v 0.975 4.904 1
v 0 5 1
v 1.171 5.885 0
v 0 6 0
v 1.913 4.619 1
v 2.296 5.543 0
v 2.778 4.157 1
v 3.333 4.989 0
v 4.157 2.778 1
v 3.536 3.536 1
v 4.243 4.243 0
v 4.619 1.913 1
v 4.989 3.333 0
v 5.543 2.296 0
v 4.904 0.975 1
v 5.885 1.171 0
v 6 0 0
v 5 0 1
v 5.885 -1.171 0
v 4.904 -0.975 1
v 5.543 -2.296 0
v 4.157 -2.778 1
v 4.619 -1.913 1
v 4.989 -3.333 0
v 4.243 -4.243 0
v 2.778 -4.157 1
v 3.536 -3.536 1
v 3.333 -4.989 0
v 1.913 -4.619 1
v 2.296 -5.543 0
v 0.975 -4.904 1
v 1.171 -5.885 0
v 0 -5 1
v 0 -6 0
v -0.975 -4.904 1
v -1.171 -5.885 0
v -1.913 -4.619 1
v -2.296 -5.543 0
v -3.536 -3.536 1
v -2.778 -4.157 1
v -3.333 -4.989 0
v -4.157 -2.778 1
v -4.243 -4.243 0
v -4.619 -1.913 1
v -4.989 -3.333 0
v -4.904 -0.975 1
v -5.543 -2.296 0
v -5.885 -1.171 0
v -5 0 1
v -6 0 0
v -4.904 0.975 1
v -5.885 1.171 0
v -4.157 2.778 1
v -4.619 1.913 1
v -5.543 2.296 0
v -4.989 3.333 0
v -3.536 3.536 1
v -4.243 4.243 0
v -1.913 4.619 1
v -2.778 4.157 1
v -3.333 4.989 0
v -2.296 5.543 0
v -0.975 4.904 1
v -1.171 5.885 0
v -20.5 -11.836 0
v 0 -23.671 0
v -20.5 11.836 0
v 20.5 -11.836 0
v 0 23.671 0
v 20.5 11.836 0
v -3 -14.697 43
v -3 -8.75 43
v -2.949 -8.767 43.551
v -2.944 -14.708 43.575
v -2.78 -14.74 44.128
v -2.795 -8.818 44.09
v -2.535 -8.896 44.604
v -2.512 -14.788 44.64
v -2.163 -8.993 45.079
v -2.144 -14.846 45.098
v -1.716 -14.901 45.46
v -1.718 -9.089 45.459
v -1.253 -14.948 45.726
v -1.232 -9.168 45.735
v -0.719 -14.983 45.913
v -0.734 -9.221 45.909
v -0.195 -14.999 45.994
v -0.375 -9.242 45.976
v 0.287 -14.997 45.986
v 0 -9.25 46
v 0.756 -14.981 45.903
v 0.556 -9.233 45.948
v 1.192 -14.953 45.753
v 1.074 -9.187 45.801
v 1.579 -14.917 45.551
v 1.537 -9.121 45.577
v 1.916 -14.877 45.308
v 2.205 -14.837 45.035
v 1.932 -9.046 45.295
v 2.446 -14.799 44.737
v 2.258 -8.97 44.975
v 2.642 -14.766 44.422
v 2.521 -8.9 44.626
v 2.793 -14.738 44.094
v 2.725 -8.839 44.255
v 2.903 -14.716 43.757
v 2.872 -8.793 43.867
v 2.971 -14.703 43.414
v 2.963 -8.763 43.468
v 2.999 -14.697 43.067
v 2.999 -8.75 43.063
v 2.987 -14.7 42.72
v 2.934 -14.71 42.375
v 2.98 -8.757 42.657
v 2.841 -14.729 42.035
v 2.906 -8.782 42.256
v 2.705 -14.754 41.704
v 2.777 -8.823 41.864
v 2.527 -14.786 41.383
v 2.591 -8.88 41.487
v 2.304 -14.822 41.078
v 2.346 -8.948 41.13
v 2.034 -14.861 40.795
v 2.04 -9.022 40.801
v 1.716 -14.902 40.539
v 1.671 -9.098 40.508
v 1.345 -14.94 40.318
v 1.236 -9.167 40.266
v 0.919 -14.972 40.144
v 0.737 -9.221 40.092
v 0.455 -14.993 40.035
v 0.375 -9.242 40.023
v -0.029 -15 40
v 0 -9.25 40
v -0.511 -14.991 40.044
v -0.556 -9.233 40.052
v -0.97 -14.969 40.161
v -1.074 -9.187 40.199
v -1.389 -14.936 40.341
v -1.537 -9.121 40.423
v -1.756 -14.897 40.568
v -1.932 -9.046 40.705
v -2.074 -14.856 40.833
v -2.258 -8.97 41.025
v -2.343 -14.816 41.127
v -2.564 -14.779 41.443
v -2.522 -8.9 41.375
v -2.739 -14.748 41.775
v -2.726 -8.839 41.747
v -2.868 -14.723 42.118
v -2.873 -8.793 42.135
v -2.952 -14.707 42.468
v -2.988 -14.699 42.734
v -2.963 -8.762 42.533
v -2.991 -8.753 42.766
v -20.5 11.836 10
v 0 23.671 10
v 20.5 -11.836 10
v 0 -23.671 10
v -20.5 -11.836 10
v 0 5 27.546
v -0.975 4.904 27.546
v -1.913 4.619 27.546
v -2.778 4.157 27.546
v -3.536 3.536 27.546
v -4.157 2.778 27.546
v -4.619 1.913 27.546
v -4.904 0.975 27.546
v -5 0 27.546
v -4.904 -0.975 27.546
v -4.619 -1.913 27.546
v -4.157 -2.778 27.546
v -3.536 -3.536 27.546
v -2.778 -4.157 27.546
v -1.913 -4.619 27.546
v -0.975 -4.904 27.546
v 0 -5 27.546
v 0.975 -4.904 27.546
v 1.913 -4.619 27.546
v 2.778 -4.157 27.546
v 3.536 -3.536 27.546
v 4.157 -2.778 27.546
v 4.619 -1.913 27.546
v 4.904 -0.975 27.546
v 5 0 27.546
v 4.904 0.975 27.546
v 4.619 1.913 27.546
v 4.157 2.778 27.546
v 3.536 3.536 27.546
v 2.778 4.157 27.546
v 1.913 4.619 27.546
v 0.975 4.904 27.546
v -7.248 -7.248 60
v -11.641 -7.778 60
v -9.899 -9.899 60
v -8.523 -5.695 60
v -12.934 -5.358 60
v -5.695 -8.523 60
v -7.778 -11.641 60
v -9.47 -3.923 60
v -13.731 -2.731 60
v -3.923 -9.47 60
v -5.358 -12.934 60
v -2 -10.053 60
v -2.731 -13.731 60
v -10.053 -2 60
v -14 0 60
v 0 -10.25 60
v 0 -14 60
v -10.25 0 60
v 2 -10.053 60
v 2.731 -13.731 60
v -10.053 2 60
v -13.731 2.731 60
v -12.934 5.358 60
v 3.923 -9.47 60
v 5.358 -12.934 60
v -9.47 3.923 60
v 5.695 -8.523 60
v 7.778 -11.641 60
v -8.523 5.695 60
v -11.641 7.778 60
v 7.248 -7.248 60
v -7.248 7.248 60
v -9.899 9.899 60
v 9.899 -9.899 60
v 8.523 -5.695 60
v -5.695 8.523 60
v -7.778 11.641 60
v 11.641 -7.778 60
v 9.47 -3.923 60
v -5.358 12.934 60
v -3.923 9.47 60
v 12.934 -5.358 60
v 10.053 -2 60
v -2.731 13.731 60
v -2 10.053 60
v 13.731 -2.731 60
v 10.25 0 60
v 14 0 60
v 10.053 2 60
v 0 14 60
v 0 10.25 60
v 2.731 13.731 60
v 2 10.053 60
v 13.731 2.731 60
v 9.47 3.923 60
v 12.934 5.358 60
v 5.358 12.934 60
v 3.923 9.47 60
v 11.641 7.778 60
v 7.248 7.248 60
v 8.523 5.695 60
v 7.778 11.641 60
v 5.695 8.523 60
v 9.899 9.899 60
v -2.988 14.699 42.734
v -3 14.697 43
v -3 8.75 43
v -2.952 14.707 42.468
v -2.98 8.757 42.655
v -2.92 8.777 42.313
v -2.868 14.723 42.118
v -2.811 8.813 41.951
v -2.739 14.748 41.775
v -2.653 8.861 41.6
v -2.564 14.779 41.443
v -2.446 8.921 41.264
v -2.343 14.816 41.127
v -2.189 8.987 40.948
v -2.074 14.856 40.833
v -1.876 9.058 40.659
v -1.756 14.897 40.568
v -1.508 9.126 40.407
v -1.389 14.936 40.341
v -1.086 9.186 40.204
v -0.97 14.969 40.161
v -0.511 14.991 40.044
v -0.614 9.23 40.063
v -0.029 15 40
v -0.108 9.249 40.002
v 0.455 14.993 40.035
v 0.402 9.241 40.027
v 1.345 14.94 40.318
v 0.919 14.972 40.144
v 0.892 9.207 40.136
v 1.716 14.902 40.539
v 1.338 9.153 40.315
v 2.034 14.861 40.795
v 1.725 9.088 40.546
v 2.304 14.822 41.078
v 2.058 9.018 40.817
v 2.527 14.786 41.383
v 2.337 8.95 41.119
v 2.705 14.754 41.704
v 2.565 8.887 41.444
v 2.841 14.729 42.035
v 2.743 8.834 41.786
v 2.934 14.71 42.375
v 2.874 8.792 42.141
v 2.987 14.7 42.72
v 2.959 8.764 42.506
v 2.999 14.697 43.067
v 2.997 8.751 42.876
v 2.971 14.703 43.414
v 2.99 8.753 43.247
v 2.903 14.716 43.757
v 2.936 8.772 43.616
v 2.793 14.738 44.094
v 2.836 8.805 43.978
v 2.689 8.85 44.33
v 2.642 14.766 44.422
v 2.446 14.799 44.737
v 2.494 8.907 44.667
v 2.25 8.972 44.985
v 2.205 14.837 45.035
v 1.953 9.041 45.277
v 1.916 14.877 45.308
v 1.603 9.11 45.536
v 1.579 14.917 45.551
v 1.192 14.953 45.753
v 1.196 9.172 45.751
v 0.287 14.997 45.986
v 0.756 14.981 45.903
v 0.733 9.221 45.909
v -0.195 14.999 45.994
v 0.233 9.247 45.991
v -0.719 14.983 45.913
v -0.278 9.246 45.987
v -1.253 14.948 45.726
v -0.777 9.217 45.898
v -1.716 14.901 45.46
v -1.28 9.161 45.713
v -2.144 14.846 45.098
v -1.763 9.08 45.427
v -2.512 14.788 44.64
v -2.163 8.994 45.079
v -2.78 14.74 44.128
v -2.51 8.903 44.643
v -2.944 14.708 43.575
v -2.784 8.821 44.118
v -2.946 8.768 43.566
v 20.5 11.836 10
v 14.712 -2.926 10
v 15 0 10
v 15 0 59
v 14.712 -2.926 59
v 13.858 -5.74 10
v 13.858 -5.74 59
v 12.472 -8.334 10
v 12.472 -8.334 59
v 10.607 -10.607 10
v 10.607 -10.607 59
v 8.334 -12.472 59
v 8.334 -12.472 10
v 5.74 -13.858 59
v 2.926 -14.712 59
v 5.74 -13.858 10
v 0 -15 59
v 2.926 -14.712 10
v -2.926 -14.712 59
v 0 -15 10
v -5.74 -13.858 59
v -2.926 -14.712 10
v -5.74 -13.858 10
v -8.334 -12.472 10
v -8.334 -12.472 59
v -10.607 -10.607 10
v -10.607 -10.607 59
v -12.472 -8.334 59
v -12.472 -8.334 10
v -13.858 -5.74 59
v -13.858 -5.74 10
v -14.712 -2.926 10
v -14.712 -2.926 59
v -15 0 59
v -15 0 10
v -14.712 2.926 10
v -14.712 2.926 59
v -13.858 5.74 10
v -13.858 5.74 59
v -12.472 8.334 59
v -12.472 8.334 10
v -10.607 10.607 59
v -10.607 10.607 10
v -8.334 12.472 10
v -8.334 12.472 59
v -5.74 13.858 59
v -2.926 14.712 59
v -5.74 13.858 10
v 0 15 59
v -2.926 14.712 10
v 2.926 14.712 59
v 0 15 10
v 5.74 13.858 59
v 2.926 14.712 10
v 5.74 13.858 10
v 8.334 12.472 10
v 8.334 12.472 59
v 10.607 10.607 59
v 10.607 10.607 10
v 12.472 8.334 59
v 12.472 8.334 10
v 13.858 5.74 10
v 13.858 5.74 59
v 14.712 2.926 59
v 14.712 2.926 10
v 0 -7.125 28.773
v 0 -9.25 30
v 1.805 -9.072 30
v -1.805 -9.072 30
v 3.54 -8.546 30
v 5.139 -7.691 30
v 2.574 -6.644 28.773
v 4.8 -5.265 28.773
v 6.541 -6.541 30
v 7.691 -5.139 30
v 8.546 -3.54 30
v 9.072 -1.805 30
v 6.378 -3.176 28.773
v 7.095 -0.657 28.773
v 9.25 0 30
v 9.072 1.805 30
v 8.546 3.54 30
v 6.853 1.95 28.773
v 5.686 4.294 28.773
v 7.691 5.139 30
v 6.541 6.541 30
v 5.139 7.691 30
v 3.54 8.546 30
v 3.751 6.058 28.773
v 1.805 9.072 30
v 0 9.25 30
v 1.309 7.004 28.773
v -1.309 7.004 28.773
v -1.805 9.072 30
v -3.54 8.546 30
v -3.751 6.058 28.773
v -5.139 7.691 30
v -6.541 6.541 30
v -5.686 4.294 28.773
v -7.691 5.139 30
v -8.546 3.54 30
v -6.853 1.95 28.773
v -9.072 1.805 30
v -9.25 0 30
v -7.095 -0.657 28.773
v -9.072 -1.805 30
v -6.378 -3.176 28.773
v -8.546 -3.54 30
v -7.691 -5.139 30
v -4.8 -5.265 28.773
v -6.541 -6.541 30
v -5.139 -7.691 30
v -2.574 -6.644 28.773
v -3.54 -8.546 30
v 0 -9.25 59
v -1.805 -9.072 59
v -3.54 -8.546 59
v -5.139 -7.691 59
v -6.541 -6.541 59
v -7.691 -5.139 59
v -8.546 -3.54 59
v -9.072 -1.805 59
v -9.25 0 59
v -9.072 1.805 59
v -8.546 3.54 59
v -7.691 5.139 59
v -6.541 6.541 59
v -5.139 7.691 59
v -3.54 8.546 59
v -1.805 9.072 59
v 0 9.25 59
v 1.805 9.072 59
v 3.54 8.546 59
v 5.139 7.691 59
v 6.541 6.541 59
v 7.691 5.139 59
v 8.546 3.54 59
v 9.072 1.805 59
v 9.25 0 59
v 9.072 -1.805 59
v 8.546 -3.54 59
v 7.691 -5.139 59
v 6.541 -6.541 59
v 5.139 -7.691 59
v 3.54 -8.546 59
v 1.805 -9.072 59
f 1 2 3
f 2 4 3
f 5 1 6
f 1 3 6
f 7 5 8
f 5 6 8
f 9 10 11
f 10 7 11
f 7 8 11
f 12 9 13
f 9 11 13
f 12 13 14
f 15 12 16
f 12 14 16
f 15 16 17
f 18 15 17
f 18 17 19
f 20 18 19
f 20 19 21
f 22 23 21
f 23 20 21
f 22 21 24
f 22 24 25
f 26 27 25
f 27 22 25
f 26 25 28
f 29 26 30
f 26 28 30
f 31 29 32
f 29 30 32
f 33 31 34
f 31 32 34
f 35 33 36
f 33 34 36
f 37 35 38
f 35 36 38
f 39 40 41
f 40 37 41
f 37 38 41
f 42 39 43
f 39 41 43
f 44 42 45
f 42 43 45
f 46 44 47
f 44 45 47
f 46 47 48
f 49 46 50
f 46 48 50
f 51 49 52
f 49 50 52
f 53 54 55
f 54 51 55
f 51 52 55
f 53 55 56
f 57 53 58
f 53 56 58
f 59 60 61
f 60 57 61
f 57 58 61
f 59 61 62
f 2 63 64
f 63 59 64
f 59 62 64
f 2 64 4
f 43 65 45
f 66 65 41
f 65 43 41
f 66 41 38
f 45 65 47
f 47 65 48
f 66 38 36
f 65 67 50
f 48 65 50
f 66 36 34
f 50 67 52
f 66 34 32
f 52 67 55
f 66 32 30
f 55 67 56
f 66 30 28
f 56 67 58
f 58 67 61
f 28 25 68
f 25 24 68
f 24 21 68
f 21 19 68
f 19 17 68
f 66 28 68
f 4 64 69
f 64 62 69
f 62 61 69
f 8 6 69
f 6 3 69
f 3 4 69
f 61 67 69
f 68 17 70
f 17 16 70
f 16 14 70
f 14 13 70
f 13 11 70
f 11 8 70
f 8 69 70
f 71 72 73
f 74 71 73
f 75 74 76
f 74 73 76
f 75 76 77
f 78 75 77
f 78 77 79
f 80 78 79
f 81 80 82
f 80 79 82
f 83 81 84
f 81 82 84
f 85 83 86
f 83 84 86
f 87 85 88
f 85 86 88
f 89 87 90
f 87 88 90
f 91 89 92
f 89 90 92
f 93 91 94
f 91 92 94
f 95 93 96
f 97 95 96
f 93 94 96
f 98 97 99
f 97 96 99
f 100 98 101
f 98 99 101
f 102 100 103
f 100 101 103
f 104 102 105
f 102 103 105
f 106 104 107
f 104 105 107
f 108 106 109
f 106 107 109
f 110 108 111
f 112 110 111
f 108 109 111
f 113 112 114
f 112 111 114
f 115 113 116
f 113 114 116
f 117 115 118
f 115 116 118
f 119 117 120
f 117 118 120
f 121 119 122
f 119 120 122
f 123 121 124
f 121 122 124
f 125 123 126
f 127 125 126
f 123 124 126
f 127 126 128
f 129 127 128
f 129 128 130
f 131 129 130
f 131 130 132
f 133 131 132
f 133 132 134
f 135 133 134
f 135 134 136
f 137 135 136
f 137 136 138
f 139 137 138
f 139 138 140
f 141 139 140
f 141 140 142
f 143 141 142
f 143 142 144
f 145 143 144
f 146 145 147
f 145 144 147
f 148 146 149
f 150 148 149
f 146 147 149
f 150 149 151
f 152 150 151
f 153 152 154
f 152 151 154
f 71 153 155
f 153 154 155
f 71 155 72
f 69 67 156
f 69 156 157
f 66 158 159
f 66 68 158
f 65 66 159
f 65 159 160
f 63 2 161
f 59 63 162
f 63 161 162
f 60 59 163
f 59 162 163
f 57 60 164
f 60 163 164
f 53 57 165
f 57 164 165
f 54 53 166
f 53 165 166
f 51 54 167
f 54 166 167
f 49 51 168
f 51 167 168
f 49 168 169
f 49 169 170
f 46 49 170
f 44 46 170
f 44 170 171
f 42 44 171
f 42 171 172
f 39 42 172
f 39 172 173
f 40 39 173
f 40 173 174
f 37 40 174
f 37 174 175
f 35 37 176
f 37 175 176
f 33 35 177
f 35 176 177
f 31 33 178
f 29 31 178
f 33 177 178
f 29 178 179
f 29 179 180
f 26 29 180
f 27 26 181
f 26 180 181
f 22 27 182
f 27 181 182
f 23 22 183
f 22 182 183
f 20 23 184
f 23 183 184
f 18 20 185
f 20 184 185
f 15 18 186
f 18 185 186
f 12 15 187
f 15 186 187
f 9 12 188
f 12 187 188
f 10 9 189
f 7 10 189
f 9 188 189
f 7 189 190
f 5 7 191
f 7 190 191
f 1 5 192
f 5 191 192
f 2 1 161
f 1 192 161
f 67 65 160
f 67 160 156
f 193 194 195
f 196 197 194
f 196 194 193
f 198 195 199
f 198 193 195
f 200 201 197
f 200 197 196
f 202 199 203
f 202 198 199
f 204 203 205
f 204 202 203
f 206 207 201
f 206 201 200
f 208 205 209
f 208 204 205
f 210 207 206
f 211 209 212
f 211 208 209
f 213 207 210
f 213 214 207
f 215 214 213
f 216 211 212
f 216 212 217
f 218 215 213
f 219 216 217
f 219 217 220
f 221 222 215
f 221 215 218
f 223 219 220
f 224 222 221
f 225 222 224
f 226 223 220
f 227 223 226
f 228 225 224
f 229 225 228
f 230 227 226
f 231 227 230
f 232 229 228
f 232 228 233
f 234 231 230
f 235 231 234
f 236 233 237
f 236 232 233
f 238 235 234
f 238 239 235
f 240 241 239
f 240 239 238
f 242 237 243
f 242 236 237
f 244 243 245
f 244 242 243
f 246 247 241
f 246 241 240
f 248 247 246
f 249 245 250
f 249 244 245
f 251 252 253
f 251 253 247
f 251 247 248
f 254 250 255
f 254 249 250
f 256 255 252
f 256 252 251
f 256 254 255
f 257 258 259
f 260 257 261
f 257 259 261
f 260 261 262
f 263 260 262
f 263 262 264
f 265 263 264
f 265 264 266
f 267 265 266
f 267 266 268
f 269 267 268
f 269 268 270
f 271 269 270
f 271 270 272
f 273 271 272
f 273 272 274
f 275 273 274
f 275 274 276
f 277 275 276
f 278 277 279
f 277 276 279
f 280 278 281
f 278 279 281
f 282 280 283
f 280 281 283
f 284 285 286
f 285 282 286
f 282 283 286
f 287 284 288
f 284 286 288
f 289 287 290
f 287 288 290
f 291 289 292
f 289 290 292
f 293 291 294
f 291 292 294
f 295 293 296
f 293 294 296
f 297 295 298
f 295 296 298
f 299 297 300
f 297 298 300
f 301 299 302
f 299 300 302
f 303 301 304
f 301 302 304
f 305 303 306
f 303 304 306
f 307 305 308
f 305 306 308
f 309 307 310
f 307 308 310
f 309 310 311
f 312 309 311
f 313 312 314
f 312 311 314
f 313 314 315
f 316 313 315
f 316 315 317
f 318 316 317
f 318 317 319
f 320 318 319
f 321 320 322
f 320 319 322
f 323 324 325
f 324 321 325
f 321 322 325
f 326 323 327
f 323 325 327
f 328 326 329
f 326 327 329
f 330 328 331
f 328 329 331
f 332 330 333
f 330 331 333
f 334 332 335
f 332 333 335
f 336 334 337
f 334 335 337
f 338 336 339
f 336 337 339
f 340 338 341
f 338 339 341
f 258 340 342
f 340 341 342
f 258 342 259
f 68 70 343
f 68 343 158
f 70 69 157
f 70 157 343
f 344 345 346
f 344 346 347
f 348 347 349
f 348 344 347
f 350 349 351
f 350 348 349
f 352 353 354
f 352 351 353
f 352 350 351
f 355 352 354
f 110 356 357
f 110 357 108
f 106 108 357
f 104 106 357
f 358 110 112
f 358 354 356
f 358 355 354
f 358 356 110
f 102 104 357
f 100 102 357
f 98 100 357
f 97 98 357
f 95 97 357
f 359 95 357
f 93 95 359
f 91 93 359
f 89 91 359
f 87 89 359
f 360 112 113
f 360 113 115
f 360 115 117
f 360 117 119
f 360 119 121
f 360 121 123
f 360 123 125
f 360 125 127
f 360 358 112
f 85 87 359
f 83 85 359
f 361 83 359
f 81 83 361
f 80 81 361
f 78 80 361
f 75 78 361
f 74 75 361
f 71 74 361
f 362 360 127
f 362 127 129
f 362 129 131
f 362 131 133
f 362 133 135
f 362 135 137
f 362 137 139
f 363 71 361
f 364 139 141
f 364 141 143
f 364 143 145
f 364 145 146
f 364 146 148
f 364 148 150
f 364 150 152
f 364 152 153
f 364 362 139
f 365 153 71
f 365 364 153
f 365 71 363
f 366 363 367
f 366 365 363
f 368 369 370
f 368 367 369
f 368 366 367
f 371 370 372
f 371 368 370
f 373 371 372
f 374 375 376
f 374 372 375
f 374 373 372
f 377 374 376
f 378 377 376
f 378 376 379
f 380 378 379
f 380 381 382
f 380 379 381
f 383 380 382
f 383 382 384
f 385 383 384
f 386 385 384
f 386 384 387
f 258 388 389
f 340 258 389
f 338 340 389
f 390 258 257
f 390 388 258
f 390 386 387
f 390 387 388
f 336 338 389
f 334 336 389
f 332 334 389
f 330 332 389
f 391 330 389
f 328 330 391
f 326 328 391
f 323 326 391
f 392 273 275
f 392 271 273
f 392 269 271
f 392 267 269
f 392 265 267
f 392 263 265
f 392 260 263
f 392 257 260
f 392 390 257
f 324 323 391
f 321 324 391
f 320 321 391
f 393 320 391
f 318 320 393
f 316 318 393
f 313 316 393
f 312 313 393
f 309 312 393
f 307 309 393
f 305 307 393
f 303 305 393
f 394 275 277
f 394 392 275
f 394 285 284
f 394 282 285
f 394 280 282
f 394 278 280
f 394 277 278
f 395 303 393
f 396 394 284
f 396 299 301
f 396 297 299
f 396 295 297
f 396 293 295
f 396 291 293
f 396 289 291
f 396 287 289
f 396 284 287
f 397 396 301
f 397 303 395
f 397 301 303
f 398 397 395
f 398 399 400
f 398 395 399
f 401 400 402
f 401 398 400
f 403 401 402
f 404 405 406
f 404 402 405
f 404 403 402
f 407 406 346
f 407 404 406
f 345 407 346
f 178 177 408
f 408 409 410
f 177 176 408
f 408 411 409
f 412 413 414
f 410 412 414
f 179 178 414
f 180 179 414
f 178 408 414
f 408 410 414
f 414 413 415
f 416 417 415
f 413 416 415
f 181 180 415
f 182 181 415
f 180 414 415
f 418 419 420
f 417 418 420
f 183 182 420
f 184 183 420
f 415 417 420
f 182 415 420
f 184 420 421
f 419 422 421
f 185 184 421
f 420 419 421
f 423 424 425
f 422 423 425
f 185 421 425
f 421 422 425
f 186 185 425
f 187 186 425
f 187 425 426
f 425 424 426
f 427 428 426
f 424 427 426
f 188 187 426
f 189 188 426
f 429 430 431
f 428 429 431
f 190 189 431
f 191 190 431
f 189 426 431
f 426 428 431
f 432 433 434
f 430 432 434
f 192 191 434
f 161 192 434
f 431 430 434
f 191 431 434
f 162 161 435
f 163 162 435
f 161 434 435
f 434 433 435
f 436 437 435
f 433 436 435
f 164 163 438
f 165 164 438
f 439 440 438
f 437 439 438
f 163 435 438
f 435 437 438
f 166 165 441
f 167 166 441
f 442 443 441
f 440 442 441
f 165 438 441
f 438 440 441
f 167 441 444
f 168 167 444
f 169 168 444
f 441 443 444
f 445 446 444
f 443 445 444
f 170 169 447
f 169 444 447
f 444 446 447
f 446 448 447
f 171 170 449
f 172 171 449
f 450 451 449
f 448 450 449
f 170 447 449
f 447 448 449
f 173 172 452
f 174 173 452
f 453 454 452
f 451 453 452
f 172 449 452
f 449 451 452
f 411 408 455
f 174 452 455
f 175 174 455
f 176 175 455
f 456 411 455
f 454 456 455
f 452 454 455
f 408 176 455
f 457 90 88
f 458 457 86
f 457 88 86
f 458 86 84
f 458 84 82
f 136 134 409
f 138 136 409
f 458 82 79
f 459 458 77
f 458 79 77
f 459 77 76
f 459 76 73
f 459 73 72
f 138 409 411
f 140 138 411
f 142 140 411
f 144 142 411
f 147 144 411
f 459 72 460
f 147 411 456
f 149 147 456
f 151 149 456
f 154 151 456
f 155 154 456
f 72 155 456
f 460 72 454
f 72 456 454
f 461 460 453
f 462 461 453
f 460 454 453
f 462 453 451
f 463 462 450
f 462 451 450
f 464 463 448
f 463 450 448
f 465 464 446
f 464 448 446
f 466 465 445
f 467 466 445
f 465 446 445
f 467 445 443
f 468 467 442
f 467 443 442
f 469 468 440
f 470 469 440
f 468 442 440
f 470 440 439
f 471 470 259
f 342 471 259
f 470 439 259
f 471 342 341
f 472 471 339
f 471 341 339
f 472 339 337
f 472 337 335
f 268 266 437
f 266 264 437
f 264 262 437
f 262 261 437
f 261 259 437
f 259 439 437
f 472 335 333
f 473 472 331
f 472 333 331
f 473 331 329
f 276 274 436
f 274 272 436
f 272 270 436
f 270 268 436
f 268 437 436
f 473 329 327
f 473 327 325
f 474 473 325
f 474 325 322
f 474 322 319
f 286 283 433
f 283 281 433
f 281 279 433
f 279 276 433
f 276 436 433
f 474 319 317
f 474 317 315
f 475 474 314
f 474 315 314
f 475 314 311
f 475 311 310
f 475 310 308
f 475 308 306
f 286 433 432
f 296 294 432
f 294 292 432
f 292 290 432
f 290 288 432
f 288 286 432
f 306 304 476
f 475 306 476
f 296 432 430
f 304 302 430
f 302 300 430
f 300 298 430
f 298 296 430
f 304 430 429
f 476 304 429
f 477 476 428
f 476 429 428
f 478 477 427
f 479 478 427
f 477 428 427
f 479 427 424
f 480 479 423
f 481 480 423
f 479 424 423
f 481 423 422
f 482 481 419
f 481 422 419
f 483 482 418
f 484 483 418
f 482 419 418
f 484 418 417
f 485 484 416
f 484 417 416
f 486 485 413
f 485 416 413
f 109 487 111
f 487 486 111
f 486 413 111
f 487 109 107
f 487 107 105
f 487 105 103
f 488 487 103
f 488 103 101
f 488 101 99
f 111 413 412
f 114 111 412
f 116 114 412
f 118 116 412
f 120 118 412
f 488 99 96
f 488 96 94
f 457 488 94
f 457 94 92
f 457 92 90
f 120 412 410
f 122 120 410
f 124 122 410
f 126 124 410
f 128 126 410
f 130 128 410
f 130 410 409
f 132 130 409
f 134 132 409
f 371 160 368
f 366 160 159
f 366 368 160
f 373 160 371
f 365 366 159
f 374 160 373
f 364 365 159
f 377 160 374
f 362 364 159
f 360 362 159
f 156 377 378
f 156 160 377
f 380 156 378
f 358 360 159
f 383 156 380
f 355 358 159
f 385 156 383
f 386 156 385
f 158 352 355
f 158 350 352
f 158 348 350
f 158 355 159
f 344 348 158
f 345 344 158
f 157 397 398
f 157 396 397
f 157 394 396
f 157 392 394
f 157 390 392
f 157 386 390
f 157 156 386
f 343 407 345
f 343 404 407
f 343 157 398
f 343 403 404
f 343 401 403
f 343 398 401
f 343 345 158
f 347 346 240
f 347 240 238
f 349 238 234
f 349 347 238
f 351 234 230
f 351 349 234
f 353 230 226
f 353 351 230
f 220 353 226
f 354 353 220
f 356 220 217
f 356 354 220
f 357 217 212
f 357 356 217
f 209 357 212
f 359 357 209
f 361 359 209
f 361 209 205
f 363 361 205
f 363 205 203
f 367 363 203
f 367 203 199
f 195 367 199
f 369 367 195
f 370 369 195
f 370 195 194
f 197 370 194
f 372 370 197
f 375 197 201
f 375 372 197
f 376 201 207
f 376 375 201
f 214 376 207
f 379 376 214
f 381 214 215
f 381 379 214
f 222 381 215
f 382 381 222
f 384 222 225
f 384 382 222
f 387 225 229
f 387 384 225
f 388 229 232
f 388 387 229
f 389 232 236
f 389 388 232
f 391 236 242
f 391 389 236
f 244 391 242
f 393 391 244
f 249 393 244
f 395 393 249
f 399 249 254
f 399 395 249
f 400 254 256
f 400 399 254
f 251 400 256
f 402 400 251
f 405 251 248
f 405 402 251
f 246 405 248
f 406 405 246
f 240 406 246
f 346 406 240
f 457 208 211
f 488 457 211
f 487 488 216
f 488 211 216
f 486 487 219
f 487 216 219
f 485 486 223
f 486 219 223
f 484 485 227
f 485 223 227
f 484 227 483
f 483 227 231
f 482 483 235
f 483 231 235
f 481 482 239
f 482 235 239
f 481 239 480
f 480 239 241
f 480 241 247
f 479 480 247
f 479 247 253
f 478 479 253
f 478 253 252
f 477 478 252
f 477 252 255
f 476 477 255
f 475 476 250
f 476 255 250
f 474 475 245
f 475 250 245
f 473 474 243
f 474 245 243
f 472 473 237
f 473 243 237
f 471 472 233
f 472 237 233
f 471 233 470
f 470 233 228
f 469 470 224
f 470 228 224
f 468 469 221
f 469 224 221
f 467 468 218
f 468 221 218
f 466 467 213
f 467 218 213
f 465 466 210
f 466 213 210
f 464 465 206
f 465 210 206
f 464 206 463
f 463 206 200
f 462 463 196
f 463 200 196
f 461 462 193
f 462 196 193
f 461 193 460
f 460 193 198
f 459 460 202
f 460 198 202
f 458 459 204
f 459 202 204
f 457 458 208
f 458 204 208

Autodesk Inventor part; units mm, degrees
ref_plane "YZ Plane" through (0, 0, 0) normal (1, 0, 0) x (0, 1, 0)
ref_plane "XZ Plane" through (0, 0, 0) normal (0, 1, 0) x (-1, 0, 0)
ref_plane "XY Plane" through (0, 0, 0) normal (0, 0, 1) x (1, 0, 0)
sketch "Эскиз1" plane through (0, 0, 0) normal (0, 0, 1) x (1, 0, 0)
  line L0 (0, 23.6714) -> (20.5, 11.8357)
  line L1 (20.5, 11.8357) -> (20.5, -11.8357)
  line L2 (20.5, -11.8357) -> (0, -23.6714)
  line L3 (0, -23.6714) -> (-20.5, -11.8357)
  line L4 (-20.5, -11.8357) -> (-20.5, 11.8357)
  line L5 (-20.5, 11.8357) -> (0, 23.6714)
  point P0 (0, 0)
  point P1 (0, 0)
  dimension "d27" = 41
extrude "Выдавливание1" add sketch "Эскиз1" along normal blind 10
sketch "Эскиз2" plane through (0, 0, 10) normal (0, 0, 1) x (1, 0, 0)
  circle A0 centre (0, 0) radius 15
  dimension "d3" = 30
extrude "Выдавливание2" add sketch "Эскиз2" along normal blind 50
sketch "Эскиз3" plane through (0, 0, 60) normal (0, 0, 1) x (1, 0, 0)
  point P0 (0, 0)
  point P1 (0, 0)
hole "Отверстие1" at (0, 0, 60) direction (0, 0, -1) diameter 18.5 depth 30 tip angle 120
sketch "Эскиз4" plane through (0, 0, 0) normal (0, 0, -1) x (-1, 0, 0)
  point P0 (0, 0)
  point P1 (0, 0)
hole "Отверстие2" at (0, 0, 0) direction (0, 0, 1) diameter 10 end through all
sketch "Эскиз5" plane through (0, 0, 0) normal (0, 1, 0) x (-1, 0, 0)
  circle A0 centre (0, 43) radius 3
  line L0 (15, 60) -> (-15, 60) projected
  point P0 (0, 0)
  dimension "d20" = 6
  dimension "d21" = 17
extrude "Выдавливание3" cut sketch "Эскиз5" along normal through all both and the other way through all
chamfer "Фаска1" distance 1 angle 45 3 edges at (0, 9.25, 60) (-15, 0, 60) (0, -5, 0)
properties part number "И7-22"
